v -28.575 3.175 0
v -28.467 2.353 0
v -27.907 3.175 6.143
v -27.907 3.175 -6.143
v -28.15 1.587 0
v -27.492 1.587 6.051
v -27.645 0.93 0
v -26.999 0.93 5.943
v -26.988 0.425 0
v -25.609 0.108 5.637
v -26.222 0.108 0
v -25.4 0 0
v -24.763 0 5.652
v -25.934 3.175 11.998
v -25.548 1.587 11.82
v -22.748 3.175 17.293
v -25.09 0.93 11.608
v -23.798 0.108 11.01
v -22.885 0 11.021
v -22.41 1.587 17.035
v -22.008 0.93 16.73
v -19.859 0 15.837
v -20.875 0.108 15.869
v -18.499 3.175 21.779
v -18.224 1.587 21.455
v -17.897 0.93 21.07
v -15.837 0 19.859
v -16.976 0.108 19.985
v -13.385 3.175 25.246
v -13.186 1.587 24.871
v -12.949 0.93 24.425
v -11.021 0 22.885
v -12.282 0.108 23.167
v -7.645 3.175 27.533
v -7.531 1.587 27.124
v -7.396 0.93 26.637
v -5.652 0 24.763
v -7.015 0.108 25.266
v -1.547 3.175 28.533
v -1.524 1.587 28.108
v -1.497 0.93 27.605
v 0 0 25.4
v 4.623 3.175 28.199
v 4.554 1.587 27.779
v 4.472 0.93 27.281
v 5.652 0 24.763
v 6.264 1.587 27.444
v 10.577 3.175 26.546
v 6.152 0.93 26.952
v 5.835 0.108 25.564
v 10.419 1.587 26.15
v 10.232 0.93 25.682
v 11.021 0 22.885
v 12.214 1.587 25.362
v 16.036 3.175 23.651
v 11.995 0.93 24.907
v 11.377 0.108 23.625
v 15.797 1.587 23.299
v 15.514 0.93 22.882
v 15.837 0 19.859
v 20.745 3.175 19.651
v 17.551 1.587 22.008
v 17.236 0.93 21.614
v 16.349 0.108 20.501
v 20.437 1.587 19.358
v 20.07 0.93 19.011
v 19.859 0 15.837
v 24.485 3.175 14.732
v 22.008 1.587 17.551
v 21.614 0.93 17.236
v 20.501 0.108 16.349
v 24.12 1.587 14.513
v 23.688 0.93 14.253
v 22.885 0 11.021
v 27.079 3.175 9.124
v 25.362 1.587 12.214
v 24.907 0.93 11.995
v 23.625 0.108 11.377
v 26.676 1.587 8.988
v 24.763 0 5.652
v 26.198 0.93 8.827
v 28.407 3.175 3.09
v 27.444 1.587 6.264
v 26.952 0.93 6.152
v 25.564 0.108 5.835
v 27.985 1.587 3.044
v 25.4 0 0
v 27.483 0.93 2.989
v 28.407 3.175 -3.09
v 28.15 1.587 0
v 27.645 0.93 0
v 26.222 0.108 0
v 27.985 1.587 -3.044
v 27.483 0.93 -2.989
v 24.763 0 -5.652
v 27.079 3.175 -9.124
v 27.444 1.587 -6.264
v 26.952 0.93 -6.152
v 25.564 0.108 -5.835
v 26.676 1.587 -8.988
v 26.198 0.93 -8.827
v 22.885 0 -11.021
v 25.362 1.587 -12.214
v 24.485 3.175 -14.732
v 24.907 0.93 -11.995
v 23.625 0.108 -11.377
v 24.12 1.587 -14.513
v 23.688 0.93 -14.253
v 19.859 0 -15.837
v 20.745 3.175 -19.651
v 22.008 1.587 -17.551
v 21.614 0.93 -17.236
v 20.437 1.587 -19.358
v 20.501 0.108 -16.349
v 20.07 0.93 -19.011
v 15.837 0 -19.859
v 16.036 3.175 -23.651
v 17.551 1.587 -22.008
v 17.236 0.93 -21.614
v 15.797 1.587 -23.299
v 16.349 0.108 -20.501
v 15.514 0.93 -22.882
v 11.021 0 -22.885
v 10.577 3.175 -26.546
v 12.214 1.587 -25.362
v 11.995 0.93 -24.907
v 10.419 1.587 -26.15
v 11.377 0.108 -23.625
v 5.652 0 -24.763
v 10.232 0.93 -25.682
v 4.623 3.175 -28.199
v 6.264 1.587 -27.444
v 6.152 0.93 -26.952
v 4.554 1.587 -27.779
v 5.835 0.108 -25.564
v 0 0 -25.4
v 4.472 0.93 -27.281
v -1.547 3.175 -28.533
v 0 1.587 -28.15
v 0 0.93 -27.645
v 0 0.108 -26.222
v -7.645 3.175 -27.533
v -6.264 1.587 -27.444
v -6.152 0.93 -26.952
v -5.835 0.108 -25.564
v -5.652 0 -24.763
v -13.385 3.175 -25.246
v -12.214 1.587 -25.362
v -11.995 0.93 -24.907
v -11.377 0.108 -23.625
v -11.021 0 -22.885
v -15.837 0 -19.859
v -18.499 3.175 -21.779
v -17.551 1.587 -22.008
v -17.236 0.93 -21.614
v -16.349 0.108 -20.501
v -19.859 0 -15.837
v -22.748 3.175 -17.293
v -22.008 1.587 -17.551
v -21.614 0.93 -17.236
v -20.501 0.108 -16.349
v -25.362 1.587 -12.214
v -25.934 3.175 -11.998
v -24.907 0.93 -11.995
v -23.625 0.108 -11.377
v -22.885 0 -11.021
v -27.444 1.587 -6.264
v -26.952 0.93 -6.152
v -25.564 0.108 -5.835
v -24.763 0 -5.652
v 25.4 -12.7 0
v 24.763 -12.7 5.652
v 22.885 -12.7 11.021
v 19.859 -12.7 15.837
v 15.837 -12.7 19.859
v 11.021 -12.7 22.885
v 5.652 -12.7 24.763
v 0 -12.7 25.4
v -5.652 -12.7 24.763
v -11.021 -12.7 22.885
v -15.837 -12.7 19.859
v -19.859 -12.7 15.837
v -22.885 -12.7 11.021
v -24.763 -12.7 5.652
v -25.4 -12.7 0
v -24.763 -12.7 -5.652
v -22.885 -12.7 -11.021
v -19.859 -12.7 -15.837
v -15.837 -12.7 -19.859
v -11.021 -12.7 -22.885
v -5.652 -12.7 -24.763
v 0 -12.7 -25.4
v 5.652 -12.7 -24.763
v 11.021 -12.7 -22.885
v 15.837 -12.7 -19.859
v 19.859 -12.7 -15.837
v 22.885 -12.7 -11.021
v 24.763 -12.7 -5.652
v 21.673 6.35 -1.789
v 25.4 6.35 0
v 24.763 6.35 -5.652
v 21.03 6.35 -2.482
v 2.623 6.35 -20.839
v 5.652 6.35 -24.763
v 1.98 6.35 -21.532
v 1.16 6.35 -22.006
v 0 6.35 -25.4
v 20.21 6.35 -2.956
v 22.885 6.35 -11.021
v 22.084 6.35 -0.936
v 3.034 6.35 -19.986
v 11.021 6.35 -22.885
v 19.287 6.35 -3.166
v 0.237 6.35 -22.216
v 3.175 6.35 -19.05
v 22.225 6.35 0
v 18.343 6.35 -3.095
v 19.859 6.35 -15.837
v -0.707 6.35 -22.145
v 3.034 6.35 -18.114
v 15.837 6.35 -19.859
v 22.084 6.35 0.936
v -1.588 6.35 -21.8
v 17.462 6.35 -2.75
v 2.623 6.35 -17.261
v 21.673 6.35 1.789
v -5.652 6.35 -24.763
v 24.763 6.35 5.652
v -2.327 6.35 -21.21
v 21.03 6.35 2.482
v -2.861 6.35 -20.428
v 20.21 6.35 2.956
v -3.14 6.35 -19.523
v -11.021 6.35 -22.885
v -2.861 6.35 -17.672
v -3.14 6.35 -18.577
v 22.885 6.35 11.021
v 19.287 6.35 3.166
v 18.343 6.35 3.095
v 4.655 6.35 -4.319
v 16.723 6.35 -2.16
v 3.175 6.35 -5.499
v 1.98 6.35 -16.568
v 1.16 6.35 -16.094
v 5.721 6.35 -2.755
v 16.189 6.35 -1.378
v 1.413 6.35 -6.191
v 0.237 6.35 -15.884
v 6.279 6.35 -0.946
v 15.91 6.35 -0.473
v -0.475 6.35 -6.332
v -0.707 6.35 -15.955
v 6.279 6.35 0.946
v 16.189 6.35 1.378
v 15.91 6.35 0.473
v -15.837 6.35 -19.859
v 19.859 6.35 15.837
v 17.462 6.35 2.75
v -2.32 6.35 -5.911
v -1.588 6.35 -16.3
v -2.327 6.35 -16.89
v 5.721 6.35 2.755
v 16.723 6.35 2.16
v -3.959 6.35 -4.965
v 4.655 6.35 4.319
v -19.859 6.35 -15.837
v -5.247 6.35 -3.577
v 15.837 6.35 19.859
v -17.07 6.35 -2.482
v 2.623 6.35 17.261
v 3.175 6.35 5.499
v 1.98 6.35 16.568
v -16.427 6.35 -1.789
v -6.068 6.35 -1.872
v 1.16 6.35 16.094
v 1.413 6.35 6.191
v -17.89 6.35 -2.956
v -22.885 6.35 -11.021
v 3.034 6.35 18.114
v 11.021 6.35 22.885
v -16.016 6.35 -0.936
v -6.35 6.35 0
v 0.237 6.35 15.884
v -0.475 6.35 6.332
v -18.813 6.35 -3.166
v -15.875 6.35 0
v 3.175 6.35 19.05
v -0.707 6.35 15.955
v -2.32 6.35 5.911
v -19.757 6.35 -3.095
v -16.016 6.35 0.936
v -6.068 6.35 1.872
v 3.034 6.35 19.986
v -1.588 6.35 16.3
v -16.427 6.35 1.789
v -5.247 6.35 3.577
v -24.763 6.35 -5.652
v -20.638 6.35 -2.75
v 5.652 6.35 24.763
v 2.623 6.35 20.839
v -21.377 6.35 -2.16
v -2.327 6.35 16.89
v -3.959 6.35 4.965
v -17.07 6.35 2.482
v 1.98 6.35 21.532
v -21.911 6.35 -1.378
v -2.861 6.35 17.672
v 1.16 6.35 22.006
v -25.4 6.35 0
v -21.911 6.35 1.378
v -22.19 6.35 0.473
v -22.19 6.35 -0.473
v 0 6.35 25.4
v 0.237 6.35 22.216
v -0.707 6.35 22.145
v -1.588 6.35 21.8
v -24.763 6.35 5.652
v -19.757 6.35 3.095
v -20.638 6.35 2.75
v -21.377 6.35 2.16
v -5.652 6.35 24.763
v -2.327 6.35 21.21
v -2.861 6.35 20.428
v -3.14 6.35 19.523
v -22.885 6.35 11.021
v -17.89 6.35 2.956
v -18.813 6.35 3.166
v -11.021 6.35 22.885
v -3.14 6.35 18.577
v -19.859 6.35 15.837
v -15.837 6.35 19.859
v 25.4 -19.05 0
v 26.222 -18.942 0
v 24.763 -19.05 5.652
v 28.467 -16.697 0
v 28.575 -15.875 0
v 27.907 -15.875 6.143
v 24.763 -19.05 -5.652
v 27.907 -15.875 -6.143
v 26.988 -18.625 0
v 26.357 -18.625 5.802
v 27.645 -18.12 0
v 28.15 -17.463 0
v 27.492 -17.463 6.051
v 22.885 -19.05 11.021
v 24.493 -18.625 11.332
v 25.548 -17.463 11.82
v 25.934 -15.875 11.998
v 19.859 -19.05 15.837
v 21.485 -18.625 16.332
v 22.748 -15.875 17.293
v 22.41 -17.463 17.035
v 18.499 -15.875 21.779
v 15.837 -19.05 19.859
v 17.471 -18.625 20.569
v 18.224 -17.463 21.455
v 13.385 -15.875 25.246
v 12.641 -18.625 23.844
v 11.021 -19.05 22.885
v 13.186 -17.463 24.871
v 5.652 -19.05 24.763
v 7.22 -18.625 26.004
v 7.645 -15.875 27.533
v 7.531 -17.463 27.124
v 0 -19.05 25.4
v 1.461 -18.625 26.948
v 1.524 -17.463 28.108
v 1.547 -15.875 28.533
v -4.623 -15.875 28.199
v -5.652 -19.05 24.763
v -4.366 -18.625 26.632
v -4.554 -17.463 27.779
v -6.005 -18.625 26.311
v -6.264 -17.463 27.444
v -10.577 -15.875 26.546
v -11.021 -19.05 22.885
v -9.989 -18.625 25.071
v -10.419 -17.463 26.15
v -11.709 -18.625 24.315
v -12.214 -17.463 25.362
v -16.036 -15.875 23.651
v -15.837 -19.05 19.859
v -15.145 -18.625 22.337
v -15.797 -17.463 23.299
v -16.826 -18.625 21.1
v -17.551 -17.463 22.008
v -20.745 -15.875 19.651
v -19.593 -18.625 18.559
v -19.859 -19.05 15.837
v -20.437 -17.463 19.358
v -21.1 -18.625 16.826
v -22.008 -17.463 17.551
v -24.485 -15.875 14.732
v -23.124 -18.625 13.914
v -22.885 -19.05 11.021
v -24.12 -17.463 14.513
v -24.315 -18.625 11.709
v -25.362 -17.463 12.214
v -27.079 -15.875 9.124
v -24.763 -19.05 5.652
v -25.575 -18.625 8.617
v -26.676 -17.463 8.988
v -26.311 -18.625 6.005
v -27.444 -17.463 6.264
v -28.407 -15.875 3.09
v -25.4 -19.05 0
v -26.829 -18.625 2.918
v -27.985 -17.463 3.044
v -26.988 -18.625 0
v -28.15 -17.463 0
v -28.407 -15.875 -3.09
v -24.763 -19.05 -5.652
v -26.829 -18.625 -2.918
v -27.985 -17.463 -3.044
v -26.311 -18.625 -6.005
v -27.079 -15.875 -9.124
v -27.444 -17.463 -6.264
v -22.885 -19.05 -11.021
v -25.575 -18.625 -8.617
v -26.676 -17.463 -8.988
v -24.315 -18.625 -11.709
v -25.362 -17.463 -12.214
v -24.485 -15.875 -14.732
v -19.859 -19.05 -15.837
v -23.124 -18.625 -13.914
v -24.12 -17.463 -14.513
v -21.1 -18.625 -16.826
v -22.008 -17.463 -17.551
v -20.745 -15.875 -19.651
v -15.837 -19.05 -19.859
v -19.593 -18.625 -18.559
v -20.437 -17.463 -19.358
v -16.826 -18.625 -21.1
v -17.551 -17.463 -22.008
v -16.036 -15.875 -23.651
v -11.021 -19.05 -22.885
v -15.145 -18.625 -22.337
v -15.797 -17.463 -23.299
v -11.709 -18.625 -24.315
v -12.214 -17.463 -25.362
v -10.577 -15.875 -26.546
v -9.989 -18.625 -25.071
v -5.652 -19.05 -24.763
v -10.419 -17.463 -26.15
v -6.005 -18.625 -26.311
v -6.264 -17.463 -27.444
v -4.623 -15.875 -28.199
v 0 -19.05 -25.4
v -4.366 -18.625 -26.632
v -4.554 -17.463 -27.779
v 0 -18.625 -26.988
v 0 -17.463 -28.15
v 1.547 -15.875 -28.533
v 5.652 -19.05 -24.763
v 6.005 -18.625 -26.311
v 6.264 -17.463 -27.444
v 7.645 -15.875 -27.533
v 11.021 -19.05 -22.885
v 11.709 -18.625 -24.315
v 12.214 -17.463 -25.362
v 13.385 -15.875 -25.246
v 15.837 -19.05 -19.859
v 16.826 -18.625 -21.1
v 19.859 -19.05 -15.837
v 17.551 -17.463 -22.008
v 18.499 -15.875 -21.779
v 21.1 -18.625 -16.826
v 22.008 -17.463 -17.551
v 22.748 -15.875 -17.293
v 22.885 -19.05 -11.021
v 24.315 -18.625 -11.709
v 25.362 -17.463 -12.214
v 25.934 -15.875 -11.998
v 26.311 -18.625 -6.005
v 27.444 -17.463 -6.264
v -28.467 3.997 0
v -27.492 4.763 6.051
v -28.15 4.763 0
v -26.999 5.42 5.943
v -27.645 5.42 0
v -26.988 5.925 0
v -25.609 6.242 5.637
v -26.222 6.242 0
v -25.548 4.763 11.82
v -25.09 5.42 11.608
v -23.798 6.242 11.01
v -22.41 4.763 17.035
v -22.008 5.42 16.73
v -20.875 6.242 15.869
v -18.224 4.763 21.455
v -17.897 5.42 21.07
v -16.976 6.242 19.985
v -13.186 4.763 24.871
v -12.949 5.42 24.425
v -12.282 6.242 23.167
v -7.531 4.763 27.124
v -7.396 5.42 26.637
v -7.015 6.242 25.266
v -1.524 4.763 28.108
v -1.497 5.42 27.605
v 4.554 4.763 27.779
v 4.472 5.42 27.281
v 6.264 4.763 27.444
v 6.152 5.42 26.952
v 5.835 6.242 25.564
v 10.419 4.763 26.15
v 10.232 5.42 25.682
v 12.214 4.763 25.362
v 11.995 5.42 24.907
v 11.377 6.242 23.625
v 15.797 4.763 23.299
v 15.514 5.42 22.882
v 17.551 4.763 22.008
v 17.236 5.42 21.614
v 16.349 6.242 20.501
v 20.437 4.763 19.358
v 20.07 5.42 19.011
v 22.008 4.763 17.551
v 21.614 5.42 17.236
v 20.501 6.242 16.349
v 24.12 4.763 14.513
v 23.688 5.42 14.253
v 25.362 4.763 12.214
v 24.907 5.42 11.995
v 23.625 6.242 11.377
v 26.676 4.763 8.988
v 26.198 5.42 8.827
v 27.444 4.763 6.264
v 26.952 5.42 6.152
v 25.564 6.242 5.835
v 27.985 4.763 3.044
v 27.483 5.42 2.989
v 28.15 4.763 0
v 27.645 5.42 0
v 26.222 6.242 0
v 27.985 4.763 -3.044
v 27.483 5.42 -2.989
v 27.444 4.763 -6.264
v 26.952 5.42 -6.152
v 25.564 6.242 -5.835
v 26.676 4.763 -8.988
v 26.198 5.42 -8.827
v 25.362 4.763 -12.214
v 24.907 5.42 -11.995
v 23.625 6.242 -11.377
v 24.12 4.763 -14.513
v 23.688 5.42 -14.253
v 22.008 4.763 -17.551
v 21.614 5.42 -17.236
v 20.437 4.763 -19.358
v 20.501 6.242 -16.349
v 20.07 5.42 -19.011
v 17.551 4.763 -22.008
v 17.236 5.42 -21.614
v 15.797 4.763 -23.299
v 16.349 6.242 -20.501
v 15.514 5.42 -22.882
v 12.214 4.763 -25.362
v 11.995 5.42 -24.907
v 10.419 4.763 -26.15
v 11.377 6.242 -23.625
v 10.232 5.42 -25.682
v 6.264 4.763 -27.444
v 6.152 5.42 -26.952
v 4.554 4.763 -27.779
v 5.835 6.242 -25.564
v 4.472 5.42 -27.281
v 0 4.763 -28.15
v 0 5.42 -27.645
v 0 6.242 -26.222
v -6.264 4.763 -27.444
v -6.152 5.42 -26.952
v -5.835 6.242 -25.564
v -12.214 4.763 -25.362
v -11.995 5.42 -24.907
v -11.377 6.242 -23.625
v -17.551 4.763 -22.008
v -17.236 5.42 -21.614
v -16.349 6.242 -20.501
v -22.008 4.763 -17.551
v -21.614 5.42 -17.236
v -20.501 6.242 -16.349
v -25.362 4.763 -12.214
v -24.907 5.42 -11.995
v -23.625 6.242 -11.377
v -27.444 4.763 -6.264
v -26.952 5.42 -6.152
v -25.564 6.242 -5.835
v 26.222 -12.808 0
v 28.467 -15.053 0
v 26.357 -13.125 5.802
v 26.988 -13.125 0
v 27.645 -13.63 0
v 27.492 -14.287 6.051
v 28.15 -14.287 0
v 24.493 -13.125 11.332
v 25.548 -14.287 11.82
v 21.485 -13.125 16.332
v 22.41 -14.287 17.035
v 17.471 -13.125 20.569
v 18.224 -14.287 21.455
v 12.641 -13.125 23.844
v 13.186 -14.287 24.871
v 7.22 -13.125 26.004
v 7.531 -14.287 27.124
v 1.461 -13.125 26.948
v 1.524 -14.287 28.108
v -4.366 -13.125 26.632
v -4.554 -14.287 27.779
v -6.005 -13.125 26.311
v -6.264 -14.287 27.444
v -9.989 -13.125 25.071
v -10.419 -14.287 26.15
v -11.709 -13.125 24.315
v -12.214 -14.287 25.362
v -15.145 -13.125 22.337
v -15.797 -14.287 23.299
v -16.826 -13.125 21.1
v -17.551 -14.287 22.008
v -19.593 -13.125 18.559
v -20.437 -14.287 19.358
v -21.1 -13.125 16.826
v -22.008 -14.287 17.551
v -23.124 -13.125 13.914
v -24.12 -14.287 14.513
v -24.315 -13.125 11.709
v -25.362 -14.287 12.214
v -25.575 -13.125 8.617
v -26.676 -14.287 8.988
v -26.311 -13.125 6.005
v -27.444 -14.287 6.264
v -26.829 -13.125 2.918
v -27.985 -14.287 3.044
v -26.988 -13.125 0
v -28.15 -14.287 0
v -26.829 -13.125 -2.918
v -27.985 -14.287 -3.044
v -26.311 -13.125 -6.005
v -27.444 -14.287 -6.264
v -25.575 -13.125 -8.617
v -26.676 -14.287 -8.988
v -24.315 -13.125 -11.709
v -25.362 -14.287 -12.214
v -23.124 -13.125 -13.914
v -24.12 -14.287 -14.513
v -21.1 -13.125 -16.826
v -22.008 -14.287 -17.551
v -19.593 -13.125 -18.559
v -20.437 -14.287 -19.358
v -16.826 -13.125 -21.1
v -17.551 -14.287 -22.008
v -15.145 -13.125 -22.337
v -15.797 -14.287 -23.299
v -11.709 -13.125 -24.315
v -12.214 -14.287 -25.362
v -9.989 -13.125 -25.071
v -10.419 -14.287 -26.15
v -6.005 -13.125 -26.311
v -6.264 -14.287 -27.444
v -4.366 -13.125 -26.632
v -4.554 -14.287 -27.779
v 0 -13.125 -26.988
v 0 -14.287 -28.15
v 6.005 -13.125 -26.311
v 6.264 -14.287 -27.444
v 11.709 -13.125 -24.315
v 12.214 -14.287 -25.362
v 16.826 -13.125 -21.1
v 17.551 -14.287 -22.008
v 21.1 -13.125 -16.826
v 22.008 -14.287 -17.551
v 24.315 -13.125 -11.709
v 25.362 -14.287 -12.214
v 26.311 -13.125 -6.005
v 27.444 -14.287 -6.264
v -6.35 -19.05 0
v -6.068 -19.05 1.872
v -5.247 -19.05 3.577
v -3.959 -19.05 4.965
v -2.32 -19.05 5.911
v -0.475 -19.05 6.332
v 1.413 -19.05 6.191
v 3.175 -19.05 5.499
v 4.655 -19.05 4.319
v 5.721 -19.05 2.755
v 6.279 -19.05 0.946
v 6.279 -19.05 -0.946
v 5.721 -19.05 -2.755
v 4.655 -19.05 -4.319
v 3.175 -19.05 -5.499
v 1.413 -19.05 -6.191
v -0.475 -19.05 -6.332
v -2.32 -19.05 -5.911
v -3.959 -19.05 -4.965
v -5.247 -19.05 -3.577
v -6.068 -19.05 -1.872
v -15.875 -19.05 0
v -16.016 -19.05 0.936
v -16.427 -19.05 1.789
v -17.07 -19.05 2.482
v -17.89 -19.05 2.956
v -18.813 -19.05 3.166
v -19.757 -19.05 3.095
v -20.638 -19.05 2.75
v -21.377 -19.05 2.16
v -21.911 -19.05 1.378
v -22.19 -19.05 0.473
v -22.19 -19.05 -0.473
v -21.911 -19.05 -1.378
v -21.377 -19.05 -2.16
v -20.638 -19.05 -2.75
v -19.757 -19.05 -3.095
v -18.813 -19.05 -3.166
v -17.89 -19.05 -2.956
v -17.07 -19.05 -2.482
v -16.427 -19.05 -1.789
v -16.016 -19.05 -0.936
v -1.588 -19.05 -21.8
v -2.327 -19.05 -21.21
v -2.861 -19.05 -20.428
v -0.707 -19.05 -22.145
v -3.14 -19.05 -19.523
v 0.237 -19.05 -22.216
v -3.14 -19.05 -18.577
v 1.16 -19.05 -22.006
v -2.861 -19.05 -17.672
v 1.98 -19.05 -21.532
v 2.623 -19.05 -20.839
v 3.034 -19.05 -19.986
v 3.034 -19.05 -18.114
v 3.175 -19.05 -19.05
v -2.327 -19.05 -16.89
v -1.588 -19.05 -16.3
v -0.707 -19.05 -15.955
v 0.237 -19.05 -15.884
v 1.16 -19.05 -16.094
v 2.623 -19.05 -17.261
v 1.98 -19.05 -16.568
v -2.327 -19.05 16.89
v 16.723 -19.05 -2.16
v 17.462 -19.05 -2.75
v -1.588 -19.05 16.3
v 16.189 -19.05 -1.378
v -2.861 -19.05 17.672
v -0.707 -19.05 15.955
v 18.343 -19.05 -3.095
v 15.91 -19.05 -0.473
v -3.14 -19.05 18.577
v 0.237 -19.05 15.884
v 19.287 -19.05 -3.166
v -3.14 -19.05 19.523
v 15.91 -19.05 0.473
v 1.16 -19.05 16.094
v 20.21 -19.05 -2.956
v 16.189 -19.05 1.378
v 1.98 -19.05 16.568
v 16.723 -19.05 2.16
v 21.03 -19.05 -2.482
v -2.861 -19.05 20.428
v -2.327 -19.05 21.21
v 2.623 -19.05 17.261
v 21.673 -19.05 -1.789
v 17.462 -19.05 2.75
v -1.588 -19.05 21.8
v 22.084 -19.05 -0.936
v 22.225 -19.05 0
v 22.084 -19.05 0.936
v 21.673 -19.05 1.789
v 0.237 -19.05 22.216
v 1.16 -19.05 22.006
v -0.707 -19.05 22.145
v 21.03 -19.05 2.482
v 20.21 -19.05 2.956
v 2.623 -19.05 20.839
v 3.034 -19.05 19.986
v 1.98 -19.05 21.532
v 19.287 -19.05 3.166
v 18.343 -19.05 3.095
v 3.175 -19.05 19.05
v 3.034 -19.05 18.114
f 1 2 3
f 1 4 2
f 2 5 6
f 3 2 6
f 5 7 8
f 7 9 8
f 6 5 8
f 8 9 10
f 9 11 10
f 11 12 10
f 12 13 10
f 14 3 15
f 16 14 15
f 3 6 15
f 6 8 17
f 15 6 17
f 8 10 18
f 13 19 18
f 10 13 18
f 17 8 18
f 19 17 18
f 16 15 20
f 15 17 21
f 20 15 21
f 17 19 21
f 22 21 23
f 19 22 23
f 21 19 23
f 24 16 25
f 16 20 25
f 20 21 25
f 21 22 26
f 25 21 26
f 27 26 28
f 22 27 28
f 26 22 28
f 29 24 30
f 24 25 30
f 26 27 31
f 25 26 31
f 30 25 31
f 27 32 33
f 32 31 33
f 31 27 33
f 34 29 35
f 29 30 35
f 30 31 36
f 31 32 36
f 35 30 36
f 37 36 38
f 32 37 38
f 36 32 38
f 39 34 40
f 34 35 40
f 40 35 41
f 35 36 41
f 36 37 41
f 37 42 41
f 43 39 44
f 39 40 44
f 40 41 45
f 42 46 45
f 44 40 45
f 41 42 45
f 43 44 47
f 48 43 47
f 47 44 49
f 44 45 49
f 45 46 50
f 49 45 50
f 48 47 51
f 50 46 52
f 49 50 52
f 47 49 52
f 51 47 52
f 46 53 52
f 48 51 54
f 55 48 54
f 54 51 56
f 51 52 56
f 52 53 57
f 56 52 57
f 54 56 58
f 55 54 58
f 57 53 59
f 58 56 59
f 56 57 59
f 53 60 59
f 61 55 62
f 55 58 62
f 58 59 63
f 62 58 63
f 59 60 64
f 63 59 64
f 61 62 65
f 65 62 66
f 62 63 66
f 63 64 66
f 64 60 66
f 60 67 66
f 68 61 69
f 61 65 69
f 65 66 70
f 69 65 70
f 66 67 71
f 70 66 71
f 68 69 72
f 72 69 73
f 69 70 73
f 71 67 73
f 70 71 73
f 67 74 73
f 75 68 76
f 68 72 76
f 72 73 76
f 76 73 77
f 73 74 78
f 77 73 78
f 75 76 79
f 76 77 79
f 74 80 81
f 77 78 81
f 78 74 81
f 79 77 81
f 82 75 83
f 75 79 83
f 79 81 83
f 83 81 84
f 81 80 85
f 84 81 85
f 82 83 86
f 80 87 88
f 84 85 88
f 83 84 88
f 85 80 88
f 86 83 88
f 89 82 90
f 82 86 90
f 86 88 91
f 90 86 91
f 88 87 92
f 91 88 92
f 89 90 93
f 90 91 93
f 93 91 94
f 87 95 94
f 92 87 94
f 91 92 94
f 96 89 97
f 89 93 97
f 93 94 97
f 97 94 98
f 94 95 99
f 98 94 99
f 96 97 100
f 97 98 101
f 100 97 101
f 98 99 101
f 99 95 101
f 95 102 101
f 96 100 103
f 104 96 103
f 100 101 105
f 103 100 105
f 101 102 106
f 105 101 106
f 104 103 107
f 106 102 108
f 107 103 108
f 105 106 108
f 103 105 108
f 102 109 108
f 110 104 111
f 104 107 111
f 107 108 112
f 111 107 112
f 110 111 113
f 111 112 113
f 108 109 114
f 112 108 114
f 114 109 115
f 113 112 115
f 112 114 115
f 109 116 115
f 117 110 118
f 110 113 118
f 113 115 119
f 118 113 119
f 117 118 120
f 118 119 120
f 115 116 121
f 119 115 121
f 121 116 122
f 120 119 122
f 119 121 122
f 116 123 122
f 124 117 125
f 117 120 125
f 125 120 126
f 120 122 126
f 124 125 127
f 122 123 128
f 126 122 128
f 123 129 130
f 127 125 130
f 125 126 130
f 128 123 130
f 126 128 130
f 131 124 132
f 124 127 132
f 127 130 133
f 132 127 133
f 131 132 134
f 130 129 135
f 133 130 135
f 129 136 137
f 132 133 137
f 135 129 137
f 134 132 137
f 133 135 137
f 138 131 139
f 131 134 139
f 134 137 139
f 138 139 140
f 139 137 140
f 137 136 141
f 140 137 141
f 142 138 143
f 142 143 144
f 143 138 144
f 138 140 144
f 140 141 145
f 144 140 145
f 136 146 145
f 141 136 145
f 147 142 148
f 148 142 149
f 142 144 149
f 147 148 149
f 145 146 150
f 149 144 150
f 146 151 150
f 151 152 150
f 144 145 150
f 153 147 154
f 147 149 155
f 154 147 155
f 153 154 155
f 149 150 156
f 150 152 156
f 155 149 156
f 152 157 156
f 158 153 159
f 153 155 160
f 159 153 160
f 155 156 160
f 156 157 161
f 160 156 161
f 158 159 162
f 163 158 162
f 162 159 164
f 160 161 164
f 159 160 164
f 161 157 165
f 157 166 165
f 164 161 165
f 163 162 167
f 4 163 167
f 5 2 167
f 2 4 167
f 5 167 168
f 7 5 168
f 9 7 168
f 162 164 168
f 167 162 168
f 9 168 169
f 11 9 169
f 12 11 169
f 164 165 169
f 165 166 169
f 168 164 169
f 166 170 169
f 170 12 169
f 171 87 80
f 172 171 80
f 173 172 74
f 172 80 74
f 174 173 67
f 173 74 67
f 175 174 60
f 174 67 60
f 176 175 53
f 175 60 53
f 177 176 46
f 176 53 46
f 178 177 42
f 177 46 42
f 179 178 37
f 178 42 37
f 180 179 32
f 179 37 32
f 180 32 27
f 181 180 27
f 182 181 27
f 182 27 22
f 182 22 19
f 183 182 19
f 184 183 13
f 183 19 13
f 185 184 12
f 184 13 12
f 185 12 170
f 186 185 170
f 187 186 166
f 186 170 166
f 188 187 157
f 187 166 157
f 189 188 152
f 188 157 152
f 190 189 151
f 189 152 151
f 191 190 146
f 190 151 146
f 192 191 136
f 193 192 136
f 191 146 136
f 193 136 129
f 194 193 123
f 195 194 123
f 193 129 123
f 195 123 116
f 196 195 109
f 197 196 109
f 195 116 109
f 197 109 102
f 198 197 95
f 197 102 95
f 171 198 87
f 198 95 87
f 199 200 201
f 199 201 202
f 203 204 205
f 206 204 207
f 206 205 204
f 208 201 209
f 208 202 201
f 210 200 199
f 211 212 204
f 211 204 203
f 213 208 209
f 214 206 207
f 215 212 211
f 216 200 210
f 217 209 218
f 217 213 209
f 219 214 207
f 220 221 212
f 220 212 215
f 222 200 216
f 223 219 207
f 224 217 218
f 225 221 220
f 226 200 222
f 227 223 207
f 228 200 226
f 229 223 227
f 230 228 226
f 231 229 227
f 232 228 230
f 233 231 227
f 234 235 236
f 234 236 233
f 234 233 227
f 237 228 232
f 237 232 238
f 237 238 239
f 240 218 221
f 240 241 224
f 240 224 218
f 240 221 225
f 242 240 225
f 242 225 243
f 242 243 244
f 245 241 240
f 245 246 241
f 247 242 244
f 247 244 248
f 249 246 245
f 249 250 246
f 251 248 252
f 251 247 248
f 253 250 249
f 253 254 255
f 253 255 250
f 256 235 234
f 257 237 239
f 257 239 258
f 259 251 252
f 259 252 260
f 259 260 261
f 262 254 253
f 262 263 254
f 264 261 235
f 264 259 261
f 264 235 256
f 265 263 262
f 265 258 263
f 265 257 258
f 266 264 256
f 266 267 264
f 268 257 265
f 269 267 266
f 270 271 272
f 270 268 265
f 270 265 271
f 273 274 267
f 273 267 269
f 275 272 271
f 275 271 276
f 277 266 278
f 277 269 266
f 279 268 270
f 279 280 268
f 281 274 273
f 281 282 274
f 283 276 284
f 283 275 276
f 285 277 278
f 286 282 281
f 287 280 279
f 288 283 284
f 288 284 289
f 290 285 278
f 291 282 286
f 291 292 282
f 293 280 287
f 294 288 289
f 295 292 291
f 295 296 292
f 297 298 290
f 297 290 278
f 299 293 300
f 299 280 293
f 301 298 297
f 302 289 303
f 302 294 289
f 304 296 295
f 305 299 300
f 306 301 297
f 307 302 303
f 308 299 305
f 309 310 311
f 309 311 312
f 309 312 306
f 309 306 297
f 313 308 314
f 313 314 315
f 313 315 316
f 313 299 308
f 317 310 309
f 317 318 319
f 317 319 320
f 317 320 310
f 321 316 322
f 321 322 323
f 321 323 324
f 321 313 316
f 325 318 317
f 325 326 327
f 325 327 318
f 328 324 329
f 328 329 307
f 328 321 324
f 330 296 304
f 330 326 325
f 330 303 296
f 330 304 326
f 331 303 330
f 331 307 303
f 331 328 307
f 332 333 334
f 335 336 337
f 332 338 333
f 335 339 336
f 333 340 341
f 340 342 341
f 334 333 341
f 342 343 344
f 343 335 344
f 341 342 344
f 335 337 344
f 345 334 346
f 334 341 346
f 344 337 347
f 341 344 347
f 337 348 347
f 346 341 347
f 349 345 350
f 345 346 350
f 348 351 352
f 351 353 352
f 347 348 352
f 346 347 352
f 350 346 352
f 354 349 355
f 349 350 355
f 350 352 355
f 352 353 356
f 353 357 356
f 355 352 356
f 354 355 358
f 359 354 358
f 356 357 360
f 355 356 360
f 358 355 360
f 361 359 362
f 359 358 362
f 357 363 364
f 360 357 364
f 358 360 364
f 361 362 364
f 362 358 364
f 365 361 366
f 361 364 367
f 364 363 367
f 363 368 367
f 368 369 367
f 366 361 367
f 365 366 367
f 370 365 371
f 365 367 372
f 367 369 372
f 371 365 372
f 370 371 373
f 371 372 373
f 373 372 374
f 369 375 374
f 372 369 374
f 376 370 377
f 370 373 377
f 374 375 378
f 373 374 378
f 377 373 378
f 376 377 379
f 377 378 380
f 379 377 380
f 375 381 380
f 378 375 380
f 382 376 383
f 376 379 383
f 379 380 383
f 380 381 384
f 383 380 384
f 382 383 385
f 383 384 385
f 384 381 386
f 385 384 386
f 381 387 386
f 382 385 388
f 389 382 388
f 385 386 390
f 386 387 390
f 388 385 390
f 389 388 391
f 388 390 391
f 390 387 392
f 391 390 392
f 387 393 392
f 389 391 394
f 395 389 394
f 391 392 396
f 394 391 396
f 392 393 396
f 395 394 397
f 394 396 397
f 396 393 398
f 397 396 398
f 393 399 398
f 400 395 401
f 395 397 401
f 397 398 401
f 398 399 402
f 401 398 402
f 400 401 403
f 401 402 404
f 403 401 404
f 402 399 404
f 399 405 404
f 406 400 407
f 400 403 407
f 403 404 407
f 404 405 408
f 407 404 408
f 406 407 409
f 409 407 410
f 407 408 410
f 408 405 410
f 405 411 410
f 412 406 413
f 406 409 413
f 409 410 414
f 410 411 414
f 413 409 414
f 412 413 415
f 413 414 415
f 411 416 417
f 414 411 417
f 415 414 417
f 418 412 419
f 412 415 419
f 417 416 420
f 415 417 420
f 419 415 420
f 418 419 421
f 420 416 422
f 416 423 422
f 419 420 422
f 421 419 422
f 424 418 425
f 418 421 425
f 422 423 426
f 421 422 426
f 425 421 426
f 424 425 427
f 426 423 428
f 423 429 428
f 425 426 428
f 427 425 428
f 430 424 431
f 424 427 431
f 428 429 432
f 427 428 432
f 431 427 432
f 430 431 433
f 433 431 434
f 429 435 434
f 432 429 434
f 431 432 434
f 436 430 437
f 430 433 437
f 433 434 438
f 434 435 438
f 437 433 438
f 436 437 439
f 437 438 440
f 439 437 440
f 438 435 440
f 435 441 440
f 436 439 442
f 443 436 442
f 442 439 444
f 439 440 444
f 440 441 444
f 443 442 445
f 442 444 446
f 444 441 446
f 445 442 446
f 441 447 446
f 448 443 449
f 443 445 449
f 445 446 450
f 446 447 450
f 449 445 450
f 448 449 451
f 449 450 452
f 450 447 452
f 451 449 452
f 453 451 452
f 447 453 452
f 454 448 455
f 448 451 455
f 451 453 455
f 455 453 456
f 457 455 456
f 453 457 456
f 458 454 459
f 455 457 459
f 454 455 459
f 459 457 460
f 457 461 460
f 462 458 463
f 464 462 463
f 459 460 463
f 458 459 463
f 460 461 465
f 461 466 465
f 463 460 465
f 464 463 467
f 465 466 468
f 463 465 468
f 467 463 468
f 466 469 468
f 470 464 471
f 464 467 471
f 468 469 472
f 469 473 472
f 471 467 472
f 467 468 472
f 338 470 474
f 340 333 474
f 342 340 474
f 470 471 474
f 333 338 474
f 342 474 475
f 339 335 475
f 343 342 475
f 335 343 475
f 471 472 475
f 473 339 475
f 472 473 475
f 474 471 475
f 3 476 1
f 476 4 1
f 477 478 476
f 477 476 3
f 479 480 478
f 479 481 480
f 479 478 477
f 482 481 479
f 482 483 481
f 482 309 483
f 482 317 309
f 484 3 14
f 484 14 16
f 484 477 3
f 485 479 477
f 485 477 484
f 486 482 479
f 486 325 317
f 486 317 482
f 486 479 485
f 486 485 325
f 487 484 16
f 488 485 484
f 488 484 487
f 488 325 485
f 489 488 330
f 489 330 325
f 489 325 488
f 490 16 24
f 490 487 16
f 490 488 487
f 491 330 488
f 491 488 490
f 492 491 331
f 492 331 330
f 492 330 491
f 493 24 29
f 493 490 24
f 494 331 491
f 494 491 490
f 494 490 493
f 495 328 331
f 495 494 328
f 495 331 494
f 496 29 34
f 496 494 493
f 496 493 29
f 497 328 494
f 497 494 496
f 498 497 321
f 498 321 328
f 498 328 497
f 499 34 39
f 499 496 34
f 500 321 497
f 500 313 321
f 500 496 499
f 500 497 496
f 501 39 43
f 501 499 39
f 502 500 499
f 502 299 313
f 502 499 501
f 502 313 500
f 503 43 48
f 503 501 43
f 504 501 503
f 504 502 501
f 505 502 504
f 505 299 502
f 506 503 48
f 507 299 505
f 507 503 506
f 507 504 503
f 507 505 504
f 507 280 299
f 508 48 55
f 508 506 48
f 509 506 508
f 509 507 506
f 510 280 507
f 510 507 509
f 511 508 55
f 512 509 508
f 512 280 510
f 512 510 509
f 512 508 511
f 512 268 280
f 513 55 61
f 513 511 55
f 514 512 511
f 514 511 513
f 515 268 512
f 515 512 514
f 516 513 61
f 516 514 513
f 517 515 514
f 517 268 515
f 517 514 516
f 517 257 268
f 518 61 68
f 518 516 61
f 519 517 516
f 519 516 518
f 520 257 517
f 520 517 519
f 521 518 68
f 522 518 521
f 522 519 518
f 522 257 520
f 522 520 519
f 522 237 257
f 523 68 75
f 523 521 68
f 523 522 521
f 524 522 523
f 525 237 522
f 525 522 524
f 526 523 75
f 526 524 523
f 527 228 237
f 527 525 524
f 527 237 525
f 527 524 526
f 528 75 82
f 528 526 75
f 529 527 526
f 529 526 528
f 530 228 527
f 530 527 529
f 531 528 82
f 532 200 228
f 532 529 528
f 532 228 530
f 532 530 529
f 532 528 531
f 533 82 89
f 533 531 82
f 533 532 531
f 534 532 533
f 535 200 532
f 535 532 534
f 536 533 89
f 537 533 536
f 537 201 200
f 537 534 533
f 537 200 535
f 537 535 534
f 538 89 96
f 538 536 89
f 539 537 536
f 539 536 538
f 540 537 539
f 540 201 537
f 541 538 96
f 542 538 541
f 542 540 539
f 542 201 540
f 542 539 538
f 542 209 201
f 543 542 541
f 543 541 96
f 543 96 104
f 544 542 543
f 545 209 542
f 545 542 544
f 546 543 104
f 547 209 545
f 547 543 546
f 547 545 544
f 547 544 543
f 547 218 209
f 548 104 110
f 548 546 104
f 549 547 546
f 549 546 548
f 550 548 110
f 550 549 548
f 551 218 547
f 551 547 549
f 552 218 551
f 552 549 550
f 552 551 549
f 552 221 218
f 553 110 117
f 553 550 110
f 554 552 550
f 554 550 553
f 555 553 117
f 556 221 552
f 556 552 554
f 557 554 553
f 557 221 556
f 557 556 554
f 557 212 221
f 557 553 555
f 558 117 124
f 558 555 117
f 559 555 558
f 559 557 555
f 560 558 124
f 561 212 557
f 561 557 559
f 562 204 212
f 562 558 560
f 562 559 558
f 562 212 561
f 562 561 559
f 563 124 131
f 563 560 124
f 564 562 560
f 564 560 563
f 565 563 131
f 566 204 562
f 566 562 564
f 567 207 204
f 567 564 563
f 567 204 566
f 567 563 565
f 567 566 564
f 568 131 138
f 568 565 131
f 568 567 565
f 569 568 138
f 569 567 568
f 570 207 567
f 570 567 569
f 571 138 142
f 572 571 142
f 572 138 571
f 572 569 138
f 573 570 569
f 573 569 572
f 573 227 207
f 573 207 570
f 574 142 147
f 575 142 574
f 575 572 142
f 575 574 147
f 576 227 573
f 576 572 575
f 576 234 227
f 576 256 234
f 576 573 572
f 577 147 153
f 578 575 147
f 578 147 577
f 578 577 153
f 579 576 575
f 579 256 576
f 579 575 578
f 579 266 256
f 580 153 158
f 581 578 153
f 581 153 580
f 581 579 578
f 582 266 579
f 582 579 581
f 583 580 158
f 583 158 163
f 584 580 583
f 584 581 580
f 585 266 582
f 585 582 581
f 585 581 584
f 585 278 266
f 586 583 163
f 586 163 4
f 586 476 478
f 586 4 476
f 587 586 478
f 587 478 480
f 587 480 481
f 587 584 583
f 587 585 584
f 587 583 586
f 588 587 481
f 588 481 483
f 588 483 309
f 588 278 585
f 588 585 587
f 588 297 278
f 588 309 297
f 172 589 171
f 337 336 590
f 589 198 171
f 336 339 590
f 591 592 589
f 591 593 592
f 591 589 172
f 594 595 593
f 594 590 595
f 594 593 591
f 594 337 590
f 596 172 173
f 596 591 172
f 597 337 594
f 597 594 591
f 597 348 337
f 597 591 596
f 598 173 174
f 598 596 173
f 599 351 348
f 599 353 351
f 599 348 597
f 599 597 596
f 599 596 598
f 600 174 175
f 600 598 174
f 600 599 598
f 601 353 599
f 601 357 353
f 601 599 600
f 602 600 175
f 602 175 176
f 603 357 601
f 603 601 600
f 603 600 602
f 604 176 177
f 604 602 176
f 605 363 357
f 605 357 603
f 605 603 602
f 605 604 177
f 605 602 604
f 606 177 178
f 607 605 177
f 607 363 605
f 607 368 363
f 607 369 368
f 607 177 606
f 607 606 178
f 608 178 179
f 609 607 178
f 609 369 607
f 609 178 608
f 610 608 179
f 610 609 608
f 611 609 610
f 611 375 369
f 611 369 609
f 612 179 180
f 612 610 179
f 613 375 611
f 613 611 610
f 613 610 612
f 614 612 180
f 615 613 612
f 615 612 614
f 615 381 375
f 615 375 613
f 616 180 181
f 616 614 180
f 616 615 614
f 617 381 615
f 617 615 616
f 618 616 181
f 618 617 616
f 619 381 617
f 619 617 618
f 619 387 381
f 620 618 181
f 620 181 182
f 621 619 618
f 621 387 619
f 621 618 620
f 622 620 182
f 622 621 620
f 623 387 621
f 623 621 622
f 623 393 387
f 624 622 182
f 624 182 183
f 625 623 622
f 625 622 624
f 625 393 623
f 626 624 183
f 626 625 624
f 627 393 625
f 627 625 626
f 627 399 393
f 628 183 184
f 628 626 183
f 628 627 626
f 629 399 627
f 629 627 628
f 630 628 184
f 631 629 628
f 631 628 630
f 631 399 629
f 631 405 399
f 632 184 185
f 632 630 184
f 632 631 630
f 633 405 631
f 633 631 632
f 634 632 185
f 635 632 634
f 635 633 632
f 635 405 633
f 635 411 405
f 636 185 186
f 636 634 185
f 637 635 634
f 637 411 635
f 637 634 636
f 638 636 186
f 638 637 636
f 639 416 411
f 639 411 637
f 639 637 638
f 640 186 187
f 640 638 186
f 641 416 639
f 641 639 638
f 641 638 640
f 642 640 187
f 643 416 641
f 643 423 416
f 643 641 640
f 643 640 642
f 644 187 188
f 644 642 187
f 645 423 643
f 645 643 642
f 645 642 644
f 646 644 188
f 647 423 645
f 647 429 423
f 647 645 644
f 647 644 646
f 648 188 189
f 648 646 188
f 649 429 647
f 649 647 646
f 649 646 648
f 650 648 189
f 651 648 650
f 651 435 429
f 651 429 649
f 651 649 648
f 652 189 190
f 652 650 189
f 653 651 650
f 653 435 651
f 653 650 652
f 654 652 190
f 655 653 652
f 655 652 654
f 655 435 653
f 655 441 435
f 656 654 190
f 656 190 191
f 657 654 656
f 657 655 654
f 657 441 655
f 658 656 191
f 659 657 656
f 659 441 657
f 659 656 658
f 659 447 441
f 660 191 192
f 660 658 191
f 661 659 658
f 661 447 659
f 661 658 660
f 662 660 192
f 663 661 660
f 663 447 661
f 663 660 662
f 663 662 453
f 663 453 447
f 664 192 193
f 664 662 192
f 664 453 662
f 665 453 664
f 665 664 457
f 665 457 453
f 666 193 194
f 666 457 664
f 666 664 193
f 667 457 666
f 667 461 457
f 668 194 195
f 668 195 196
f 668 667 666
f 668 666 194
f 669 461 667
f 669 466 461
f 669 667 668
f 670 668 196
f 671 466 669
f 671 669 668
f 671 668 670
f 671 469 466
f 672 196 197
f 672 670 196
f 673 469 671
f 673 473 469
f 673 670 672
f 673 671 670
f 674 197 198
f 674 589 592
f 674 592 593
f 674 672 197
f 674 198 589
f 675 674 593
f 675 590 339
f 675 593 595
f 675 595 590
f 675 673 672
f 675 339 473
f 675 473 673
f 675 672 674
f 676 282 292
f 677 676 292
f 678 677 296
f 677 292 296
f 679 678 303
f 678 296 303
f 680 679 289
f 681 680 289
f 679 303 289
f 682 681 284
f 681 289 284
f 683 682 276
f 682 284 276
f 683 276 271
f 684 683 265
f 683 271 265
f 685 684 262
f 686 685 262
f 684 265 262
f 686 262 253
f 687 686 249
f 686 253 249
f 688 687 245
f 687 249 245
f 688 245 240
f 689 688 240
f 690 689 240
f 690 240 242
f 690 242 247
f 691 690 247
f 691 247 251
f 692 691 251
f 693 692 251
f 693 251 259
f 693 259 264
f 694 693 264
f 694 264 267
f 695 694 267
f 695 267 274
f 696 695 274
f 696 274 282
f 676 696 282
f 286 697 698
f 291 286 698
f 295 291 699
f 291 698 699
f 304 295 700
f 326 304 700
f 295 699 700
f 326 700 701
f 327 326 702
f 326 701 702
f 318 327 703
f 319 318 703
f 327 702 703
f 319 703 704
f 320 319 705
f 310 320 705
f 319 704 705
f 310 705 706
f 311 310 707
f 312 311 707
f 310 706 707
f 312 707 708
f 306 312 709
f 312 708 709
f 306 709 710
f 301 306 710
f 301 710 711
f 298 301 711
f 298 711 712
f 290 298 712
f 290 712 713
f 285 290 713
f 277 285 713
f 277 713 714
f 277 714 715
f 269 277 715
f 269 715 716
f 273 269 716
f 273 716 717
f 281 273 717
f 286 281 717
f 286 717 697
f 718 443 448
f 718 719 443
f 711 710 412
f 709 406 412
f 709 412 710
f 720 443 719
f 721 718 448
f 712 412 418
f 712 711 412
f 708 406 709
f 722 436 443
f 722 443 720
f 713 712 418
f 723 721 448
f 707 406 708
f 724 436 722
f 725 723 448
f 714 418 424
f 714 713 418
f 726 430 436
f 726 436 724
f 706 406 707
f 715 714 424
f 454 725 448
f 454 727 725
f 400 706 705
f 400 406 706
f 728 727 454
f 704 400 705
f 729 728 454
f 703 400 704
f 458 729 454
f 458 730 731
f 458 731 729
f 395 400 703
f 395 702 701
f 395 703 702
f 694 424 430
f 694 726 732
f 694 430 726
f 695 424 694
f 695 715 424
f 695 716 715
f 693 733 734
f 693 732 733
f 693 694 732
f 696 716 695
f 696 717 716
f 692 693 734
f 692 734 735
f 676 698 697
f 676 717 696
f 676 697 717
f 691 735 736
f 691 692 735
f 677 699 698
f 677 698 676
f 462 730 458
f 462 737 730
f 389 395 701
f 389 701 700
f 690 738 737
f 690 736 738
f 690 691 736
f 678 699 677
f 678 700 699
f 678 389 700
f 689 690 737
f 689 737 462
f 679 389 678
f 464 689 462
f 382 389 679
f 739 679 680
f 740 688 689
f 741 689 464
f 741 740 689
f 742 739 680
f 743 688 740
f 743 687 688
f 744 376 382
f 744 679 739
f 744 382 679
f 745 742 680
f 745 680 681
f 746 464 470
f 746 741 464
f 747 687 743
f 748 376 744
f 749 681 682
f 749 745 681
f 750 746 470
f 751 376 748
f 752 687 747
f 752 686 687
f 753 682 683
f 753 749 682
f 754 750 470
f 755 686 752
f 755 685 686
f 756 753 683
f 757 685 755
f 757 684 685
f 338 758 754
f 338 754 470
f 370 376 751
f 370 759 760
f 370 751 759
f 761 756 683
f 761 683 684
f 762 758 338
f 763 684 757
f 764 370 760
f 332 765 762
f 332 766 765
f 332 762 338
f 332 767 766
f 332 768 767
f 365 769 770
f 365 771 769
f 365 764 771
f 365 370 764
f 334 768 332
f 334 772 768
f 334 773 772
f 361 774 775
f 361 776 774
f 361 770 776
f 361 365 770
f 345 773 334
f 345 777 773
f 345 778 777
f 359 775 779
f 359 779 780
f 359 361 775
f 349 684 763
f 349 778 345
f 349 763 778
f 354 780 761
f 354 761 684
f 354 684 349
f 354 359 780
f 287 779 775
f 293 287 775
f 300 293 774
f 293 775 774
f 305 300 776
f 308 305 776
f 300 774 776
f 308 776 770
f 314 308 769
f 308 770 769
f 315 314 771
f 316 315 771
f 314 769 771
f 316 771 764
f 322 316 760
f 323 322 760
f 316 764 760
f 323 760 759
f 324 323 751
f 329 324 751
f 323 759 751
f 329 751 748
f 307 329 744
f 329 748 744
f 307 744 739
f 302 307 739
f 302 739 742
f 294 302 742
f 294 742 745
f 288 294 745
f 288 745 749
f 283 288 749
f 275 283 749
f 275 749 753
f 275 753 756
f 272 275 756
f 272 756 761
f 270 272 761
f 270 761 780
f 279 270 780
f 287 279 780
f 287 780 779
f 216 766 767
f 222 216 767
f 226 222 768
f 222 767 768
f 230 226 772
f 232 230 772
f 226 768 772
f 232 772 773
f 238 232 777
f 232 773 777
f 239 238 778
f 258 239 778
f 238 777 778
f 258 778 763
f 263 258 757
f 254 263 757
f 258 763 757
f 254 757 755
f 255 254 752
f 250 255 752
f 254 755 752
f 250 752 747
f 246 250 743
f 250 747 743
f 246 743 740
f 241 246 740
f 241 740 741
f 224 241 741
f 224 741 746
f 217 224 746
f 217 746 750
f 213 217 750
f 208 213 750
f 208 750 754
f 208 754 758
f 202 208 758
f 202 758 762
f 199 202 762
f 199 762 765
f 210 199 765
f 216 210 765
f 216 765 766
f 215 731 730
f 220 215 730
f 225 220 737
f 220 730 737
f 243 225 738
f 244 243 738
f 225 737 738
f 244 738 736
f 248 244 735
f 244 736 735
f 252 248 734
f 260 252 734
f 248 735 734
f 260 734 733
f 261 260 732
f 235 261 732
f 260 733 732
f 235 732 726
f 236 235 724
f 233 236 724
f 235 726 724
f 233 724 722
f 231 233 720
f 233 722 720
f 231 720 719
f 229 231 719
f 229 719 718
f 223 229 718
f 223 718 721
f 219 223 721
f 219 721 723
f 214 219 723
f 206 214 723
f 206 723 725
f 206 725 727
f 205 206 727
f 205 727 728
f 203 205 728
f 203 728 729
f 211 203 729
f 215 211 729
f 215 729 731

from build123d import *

# Parameters (mm, degrees)
F0_R     = 25.4
F1_DEPTH = 12.7
F2_R     = 28.575
F3_DEPTH = 6.35
F4_R     = 28.575
F5_DEPTH = 6.35
F6_R     = 6.35
F7_DEPTH = 25.401
F9_D     = 6.35
F10_R    = 3.17499


# Not quite as in the source:
# - a fillet or chamfer is up to 0.001 mm smaller than in the source, because OpenCascade refuses the exact size


with BuildPart() as f1:
    # F0 (on Front) → F1 (new body)
    with BuildSketch(Plane.XZ):
        Circle(F0_R)
    extrude(amount=F1_DEPTH)

    # F2 (on face) → F3 (join)
    with BuildSketch(Plane.XZ.offset(12.7)):
        Circle(F2_R)
    extrude(amount=F3_DEPTH)

    # F4 (on face) → F5 (join)
    with BuildSketch(Plane(origin=(0, 0, 0), x_dir=(-1, 0, 0), z_dir=(0, 1, 0))):
        Circle(F4_R)
    extrude(amount=F5_DEPTH)

    # F6 (on face) → F7 (cut, through all)
    with BuildSketch(Plane(origin=(0, 6.35, 0), x_dir=(-1, 0, 0), z_dir=(0, 1, 0))):
        Circle(F6_R)
    extrude(amount=-F7_DEPTH, mode=Mode.SUBTRACT)

    # F9 (through all)
    with Locations(Plane(origin=(0, 6.35, 0), x_dir=(-1, 0, 0), z_dir=(0, 1, 0))):
        with Locations((0, 19.05), (19.05, 0), (0, -19.05), (-19.05, 0)):
            Hole(F9_D / 2)

    # F10 (radius 3.175 in the source; OpenCascade refuses exactly that, so slightly less here)
    f10_edges = [f1.edges().sort_by_distance(p)[0] for p in [
        (28.575, 6.35, 0),
        (28.575, 0, 0),
        (-28.575, -12.7, 0),
        (-28.575, -19.05, 0),
    ]]
    fillet(f10_edges, radius=F10_R)


solid = f1.part
